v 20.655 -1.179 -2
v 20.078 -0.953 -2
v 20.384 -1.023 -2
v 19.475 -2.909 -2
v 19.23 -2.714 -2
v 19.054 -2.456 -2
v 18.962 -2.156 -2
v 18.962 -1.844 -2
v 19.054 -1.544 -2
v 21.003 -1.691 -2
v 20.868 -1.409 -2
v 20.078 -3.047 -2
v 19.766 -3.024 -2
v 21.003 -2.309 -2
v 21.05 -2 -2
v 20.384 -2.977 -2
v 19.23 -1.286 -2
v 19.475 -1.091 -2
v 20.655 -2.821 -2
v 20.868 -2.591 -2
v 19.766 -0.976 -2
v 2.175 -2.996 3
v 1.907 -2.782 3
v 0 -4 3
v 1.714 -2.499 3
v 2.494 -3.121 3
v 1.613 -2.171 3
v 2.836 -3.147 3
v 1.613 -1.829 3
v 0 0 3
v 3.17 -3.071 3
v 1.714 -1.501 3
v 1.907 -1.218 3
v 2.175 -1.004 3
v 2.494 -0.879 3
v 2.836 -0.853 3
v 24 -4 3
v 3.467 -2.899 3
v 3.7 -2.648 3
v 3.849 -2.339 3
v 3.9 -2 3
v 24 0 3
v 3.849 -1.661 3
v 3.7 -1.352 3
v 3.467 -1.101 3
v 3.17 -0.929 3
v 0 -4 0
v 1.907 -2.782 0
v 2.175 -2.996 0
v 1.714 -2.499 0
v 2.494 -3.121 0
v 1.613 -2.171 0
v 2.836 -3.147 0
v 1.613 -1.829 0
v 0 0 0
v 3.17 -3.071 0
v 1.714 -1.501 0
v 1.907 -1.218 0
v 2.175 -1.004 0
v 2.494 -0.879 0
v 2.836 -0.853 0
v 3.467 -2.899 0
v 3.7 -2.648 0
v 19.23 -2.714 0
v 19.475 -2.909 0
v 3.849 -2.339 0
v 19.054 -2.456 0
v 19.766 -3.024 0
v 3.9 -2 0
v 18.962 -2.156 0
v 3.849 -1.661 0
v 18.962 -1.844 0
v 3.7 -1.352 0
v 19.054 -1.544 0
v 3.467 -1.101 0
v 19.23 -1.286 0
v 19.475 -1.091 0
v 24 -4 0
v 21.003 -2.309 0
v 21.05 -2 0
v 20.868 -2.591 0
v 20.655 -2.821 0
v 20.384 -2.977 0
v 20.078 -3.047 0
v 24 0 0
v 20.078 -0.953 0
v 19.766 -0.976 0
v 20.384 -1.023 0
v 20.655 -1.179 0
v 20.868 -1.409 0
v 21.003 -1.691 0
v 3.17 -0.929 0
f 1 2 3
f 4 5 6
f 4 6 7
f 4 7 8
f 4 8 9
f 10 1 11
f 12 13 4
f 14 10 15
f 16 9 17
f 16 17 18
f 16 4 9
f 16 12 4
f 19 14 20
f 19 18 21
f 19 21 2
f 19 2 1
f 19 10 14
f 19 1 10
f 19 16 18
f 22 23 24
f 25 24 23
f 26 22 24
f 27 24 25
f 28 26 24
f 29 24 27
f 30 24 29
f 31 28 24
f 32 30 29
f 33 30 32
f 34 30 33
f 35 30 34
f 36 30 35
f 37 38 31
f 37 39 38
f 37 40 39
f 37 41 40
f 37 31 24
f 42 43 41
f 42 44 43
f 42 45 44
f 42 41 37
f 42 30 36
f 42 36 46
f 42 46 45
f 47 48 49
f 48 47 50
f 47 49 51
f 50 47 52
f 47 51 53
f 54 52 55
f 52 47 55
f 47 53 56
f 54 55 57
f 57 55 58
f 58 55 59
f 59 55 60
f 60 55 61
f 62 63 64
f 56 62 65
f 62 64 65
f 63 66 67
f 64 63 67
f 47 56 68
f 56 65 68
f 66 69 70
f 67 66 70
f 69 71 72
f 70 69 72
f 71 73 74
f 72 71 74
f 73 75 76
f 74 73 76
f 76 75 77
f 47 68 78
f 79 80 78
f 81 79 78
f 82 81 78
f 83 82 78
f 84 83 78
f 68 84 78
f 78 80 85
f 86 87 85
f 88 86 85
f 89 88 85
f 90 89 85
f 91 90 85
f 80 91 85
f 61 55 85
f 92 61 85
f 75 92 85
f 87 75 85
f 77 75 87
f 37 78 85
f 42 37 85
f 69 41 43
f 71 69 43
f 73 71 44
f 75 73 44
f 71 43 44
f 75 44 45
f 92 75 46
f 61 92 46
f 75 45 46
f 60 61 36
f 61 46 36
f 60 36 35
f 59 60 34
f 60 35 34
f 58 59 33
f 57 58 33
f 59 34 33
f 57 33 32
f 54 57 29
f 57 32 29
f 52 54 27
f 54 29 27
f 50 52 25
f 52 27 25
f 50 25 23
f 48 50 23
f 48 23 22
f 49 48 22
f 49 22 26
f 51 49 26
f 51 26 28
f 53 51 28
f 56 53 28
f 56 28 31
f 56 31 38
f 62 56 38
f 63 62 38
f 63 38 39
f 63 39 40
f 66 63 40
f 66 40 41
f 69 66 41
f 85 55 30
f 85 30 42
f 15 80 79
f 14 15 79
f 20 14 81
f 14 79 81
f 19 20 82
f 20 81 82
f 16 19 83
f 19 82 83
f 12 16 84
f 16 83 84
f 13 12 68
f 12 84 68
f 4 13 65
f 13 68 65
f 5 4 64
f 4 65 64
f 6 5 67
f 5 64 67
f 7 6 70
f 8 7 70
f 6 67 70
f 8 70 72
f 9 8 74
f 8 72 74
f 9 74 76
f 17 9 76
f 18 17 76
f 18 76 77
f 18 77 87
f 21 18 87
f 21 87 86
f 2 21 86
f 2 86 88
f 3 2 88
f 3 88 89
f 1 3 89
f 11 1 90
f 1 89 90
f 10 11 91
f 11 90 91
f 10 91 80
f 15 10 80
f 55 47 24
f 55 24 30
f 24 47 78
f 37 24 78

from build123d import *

# Parameters (mm, degrees)
CROQUIS1_W              = 24
CROQUIS1_H              = 4
SALIENTE_EXTRUIR1_DEPTH = 3
CROQUIS4_R              = 1.15
CORTAR_EXTRUIR2_DEPTH   = 25.515301344
CROQUIS3_R              = 1.05
SALIENTE_EXTRUIR3_DEPTH = 2


with BuildPart() as part:
    # Croquis1 → Saliente-Extruir1 (new body)
    with BuildSketch(Plane.XY):
        with Locations((12, -2)):
            Rectangle(CROQUIS1_W, CROQUIS1_H)
    extrude(amount=SALIENTE_EXTRUIR1_DEPTH)

    # Croquis4 → Cortar-Extruir2 (cut, through all)
    with BuildSketch(Plane.XY.offset(3)):
        with Locations((2.75, -2)):
            Circle(CROQUIS4_R)
    extrude(amount=-CORTAR_EXTRUIR2_DEPTH, mode=Mode.SUBTRACT)

    # Croquis3 → Saliente-Extruir3 (add)
    with BuildSketch(Plane(origin=(0, 0, 0), x_dir=(-1, 0, 0), z_dir=(0, 0, -1))):
        with Locations(Location((-20, -2, 0), (0, 0, 180))):
            Circle(CROQUIS3_R)
    extrude(amount=SALIENTE_EXTRUIR3_DEPTH)


solid = part.part
